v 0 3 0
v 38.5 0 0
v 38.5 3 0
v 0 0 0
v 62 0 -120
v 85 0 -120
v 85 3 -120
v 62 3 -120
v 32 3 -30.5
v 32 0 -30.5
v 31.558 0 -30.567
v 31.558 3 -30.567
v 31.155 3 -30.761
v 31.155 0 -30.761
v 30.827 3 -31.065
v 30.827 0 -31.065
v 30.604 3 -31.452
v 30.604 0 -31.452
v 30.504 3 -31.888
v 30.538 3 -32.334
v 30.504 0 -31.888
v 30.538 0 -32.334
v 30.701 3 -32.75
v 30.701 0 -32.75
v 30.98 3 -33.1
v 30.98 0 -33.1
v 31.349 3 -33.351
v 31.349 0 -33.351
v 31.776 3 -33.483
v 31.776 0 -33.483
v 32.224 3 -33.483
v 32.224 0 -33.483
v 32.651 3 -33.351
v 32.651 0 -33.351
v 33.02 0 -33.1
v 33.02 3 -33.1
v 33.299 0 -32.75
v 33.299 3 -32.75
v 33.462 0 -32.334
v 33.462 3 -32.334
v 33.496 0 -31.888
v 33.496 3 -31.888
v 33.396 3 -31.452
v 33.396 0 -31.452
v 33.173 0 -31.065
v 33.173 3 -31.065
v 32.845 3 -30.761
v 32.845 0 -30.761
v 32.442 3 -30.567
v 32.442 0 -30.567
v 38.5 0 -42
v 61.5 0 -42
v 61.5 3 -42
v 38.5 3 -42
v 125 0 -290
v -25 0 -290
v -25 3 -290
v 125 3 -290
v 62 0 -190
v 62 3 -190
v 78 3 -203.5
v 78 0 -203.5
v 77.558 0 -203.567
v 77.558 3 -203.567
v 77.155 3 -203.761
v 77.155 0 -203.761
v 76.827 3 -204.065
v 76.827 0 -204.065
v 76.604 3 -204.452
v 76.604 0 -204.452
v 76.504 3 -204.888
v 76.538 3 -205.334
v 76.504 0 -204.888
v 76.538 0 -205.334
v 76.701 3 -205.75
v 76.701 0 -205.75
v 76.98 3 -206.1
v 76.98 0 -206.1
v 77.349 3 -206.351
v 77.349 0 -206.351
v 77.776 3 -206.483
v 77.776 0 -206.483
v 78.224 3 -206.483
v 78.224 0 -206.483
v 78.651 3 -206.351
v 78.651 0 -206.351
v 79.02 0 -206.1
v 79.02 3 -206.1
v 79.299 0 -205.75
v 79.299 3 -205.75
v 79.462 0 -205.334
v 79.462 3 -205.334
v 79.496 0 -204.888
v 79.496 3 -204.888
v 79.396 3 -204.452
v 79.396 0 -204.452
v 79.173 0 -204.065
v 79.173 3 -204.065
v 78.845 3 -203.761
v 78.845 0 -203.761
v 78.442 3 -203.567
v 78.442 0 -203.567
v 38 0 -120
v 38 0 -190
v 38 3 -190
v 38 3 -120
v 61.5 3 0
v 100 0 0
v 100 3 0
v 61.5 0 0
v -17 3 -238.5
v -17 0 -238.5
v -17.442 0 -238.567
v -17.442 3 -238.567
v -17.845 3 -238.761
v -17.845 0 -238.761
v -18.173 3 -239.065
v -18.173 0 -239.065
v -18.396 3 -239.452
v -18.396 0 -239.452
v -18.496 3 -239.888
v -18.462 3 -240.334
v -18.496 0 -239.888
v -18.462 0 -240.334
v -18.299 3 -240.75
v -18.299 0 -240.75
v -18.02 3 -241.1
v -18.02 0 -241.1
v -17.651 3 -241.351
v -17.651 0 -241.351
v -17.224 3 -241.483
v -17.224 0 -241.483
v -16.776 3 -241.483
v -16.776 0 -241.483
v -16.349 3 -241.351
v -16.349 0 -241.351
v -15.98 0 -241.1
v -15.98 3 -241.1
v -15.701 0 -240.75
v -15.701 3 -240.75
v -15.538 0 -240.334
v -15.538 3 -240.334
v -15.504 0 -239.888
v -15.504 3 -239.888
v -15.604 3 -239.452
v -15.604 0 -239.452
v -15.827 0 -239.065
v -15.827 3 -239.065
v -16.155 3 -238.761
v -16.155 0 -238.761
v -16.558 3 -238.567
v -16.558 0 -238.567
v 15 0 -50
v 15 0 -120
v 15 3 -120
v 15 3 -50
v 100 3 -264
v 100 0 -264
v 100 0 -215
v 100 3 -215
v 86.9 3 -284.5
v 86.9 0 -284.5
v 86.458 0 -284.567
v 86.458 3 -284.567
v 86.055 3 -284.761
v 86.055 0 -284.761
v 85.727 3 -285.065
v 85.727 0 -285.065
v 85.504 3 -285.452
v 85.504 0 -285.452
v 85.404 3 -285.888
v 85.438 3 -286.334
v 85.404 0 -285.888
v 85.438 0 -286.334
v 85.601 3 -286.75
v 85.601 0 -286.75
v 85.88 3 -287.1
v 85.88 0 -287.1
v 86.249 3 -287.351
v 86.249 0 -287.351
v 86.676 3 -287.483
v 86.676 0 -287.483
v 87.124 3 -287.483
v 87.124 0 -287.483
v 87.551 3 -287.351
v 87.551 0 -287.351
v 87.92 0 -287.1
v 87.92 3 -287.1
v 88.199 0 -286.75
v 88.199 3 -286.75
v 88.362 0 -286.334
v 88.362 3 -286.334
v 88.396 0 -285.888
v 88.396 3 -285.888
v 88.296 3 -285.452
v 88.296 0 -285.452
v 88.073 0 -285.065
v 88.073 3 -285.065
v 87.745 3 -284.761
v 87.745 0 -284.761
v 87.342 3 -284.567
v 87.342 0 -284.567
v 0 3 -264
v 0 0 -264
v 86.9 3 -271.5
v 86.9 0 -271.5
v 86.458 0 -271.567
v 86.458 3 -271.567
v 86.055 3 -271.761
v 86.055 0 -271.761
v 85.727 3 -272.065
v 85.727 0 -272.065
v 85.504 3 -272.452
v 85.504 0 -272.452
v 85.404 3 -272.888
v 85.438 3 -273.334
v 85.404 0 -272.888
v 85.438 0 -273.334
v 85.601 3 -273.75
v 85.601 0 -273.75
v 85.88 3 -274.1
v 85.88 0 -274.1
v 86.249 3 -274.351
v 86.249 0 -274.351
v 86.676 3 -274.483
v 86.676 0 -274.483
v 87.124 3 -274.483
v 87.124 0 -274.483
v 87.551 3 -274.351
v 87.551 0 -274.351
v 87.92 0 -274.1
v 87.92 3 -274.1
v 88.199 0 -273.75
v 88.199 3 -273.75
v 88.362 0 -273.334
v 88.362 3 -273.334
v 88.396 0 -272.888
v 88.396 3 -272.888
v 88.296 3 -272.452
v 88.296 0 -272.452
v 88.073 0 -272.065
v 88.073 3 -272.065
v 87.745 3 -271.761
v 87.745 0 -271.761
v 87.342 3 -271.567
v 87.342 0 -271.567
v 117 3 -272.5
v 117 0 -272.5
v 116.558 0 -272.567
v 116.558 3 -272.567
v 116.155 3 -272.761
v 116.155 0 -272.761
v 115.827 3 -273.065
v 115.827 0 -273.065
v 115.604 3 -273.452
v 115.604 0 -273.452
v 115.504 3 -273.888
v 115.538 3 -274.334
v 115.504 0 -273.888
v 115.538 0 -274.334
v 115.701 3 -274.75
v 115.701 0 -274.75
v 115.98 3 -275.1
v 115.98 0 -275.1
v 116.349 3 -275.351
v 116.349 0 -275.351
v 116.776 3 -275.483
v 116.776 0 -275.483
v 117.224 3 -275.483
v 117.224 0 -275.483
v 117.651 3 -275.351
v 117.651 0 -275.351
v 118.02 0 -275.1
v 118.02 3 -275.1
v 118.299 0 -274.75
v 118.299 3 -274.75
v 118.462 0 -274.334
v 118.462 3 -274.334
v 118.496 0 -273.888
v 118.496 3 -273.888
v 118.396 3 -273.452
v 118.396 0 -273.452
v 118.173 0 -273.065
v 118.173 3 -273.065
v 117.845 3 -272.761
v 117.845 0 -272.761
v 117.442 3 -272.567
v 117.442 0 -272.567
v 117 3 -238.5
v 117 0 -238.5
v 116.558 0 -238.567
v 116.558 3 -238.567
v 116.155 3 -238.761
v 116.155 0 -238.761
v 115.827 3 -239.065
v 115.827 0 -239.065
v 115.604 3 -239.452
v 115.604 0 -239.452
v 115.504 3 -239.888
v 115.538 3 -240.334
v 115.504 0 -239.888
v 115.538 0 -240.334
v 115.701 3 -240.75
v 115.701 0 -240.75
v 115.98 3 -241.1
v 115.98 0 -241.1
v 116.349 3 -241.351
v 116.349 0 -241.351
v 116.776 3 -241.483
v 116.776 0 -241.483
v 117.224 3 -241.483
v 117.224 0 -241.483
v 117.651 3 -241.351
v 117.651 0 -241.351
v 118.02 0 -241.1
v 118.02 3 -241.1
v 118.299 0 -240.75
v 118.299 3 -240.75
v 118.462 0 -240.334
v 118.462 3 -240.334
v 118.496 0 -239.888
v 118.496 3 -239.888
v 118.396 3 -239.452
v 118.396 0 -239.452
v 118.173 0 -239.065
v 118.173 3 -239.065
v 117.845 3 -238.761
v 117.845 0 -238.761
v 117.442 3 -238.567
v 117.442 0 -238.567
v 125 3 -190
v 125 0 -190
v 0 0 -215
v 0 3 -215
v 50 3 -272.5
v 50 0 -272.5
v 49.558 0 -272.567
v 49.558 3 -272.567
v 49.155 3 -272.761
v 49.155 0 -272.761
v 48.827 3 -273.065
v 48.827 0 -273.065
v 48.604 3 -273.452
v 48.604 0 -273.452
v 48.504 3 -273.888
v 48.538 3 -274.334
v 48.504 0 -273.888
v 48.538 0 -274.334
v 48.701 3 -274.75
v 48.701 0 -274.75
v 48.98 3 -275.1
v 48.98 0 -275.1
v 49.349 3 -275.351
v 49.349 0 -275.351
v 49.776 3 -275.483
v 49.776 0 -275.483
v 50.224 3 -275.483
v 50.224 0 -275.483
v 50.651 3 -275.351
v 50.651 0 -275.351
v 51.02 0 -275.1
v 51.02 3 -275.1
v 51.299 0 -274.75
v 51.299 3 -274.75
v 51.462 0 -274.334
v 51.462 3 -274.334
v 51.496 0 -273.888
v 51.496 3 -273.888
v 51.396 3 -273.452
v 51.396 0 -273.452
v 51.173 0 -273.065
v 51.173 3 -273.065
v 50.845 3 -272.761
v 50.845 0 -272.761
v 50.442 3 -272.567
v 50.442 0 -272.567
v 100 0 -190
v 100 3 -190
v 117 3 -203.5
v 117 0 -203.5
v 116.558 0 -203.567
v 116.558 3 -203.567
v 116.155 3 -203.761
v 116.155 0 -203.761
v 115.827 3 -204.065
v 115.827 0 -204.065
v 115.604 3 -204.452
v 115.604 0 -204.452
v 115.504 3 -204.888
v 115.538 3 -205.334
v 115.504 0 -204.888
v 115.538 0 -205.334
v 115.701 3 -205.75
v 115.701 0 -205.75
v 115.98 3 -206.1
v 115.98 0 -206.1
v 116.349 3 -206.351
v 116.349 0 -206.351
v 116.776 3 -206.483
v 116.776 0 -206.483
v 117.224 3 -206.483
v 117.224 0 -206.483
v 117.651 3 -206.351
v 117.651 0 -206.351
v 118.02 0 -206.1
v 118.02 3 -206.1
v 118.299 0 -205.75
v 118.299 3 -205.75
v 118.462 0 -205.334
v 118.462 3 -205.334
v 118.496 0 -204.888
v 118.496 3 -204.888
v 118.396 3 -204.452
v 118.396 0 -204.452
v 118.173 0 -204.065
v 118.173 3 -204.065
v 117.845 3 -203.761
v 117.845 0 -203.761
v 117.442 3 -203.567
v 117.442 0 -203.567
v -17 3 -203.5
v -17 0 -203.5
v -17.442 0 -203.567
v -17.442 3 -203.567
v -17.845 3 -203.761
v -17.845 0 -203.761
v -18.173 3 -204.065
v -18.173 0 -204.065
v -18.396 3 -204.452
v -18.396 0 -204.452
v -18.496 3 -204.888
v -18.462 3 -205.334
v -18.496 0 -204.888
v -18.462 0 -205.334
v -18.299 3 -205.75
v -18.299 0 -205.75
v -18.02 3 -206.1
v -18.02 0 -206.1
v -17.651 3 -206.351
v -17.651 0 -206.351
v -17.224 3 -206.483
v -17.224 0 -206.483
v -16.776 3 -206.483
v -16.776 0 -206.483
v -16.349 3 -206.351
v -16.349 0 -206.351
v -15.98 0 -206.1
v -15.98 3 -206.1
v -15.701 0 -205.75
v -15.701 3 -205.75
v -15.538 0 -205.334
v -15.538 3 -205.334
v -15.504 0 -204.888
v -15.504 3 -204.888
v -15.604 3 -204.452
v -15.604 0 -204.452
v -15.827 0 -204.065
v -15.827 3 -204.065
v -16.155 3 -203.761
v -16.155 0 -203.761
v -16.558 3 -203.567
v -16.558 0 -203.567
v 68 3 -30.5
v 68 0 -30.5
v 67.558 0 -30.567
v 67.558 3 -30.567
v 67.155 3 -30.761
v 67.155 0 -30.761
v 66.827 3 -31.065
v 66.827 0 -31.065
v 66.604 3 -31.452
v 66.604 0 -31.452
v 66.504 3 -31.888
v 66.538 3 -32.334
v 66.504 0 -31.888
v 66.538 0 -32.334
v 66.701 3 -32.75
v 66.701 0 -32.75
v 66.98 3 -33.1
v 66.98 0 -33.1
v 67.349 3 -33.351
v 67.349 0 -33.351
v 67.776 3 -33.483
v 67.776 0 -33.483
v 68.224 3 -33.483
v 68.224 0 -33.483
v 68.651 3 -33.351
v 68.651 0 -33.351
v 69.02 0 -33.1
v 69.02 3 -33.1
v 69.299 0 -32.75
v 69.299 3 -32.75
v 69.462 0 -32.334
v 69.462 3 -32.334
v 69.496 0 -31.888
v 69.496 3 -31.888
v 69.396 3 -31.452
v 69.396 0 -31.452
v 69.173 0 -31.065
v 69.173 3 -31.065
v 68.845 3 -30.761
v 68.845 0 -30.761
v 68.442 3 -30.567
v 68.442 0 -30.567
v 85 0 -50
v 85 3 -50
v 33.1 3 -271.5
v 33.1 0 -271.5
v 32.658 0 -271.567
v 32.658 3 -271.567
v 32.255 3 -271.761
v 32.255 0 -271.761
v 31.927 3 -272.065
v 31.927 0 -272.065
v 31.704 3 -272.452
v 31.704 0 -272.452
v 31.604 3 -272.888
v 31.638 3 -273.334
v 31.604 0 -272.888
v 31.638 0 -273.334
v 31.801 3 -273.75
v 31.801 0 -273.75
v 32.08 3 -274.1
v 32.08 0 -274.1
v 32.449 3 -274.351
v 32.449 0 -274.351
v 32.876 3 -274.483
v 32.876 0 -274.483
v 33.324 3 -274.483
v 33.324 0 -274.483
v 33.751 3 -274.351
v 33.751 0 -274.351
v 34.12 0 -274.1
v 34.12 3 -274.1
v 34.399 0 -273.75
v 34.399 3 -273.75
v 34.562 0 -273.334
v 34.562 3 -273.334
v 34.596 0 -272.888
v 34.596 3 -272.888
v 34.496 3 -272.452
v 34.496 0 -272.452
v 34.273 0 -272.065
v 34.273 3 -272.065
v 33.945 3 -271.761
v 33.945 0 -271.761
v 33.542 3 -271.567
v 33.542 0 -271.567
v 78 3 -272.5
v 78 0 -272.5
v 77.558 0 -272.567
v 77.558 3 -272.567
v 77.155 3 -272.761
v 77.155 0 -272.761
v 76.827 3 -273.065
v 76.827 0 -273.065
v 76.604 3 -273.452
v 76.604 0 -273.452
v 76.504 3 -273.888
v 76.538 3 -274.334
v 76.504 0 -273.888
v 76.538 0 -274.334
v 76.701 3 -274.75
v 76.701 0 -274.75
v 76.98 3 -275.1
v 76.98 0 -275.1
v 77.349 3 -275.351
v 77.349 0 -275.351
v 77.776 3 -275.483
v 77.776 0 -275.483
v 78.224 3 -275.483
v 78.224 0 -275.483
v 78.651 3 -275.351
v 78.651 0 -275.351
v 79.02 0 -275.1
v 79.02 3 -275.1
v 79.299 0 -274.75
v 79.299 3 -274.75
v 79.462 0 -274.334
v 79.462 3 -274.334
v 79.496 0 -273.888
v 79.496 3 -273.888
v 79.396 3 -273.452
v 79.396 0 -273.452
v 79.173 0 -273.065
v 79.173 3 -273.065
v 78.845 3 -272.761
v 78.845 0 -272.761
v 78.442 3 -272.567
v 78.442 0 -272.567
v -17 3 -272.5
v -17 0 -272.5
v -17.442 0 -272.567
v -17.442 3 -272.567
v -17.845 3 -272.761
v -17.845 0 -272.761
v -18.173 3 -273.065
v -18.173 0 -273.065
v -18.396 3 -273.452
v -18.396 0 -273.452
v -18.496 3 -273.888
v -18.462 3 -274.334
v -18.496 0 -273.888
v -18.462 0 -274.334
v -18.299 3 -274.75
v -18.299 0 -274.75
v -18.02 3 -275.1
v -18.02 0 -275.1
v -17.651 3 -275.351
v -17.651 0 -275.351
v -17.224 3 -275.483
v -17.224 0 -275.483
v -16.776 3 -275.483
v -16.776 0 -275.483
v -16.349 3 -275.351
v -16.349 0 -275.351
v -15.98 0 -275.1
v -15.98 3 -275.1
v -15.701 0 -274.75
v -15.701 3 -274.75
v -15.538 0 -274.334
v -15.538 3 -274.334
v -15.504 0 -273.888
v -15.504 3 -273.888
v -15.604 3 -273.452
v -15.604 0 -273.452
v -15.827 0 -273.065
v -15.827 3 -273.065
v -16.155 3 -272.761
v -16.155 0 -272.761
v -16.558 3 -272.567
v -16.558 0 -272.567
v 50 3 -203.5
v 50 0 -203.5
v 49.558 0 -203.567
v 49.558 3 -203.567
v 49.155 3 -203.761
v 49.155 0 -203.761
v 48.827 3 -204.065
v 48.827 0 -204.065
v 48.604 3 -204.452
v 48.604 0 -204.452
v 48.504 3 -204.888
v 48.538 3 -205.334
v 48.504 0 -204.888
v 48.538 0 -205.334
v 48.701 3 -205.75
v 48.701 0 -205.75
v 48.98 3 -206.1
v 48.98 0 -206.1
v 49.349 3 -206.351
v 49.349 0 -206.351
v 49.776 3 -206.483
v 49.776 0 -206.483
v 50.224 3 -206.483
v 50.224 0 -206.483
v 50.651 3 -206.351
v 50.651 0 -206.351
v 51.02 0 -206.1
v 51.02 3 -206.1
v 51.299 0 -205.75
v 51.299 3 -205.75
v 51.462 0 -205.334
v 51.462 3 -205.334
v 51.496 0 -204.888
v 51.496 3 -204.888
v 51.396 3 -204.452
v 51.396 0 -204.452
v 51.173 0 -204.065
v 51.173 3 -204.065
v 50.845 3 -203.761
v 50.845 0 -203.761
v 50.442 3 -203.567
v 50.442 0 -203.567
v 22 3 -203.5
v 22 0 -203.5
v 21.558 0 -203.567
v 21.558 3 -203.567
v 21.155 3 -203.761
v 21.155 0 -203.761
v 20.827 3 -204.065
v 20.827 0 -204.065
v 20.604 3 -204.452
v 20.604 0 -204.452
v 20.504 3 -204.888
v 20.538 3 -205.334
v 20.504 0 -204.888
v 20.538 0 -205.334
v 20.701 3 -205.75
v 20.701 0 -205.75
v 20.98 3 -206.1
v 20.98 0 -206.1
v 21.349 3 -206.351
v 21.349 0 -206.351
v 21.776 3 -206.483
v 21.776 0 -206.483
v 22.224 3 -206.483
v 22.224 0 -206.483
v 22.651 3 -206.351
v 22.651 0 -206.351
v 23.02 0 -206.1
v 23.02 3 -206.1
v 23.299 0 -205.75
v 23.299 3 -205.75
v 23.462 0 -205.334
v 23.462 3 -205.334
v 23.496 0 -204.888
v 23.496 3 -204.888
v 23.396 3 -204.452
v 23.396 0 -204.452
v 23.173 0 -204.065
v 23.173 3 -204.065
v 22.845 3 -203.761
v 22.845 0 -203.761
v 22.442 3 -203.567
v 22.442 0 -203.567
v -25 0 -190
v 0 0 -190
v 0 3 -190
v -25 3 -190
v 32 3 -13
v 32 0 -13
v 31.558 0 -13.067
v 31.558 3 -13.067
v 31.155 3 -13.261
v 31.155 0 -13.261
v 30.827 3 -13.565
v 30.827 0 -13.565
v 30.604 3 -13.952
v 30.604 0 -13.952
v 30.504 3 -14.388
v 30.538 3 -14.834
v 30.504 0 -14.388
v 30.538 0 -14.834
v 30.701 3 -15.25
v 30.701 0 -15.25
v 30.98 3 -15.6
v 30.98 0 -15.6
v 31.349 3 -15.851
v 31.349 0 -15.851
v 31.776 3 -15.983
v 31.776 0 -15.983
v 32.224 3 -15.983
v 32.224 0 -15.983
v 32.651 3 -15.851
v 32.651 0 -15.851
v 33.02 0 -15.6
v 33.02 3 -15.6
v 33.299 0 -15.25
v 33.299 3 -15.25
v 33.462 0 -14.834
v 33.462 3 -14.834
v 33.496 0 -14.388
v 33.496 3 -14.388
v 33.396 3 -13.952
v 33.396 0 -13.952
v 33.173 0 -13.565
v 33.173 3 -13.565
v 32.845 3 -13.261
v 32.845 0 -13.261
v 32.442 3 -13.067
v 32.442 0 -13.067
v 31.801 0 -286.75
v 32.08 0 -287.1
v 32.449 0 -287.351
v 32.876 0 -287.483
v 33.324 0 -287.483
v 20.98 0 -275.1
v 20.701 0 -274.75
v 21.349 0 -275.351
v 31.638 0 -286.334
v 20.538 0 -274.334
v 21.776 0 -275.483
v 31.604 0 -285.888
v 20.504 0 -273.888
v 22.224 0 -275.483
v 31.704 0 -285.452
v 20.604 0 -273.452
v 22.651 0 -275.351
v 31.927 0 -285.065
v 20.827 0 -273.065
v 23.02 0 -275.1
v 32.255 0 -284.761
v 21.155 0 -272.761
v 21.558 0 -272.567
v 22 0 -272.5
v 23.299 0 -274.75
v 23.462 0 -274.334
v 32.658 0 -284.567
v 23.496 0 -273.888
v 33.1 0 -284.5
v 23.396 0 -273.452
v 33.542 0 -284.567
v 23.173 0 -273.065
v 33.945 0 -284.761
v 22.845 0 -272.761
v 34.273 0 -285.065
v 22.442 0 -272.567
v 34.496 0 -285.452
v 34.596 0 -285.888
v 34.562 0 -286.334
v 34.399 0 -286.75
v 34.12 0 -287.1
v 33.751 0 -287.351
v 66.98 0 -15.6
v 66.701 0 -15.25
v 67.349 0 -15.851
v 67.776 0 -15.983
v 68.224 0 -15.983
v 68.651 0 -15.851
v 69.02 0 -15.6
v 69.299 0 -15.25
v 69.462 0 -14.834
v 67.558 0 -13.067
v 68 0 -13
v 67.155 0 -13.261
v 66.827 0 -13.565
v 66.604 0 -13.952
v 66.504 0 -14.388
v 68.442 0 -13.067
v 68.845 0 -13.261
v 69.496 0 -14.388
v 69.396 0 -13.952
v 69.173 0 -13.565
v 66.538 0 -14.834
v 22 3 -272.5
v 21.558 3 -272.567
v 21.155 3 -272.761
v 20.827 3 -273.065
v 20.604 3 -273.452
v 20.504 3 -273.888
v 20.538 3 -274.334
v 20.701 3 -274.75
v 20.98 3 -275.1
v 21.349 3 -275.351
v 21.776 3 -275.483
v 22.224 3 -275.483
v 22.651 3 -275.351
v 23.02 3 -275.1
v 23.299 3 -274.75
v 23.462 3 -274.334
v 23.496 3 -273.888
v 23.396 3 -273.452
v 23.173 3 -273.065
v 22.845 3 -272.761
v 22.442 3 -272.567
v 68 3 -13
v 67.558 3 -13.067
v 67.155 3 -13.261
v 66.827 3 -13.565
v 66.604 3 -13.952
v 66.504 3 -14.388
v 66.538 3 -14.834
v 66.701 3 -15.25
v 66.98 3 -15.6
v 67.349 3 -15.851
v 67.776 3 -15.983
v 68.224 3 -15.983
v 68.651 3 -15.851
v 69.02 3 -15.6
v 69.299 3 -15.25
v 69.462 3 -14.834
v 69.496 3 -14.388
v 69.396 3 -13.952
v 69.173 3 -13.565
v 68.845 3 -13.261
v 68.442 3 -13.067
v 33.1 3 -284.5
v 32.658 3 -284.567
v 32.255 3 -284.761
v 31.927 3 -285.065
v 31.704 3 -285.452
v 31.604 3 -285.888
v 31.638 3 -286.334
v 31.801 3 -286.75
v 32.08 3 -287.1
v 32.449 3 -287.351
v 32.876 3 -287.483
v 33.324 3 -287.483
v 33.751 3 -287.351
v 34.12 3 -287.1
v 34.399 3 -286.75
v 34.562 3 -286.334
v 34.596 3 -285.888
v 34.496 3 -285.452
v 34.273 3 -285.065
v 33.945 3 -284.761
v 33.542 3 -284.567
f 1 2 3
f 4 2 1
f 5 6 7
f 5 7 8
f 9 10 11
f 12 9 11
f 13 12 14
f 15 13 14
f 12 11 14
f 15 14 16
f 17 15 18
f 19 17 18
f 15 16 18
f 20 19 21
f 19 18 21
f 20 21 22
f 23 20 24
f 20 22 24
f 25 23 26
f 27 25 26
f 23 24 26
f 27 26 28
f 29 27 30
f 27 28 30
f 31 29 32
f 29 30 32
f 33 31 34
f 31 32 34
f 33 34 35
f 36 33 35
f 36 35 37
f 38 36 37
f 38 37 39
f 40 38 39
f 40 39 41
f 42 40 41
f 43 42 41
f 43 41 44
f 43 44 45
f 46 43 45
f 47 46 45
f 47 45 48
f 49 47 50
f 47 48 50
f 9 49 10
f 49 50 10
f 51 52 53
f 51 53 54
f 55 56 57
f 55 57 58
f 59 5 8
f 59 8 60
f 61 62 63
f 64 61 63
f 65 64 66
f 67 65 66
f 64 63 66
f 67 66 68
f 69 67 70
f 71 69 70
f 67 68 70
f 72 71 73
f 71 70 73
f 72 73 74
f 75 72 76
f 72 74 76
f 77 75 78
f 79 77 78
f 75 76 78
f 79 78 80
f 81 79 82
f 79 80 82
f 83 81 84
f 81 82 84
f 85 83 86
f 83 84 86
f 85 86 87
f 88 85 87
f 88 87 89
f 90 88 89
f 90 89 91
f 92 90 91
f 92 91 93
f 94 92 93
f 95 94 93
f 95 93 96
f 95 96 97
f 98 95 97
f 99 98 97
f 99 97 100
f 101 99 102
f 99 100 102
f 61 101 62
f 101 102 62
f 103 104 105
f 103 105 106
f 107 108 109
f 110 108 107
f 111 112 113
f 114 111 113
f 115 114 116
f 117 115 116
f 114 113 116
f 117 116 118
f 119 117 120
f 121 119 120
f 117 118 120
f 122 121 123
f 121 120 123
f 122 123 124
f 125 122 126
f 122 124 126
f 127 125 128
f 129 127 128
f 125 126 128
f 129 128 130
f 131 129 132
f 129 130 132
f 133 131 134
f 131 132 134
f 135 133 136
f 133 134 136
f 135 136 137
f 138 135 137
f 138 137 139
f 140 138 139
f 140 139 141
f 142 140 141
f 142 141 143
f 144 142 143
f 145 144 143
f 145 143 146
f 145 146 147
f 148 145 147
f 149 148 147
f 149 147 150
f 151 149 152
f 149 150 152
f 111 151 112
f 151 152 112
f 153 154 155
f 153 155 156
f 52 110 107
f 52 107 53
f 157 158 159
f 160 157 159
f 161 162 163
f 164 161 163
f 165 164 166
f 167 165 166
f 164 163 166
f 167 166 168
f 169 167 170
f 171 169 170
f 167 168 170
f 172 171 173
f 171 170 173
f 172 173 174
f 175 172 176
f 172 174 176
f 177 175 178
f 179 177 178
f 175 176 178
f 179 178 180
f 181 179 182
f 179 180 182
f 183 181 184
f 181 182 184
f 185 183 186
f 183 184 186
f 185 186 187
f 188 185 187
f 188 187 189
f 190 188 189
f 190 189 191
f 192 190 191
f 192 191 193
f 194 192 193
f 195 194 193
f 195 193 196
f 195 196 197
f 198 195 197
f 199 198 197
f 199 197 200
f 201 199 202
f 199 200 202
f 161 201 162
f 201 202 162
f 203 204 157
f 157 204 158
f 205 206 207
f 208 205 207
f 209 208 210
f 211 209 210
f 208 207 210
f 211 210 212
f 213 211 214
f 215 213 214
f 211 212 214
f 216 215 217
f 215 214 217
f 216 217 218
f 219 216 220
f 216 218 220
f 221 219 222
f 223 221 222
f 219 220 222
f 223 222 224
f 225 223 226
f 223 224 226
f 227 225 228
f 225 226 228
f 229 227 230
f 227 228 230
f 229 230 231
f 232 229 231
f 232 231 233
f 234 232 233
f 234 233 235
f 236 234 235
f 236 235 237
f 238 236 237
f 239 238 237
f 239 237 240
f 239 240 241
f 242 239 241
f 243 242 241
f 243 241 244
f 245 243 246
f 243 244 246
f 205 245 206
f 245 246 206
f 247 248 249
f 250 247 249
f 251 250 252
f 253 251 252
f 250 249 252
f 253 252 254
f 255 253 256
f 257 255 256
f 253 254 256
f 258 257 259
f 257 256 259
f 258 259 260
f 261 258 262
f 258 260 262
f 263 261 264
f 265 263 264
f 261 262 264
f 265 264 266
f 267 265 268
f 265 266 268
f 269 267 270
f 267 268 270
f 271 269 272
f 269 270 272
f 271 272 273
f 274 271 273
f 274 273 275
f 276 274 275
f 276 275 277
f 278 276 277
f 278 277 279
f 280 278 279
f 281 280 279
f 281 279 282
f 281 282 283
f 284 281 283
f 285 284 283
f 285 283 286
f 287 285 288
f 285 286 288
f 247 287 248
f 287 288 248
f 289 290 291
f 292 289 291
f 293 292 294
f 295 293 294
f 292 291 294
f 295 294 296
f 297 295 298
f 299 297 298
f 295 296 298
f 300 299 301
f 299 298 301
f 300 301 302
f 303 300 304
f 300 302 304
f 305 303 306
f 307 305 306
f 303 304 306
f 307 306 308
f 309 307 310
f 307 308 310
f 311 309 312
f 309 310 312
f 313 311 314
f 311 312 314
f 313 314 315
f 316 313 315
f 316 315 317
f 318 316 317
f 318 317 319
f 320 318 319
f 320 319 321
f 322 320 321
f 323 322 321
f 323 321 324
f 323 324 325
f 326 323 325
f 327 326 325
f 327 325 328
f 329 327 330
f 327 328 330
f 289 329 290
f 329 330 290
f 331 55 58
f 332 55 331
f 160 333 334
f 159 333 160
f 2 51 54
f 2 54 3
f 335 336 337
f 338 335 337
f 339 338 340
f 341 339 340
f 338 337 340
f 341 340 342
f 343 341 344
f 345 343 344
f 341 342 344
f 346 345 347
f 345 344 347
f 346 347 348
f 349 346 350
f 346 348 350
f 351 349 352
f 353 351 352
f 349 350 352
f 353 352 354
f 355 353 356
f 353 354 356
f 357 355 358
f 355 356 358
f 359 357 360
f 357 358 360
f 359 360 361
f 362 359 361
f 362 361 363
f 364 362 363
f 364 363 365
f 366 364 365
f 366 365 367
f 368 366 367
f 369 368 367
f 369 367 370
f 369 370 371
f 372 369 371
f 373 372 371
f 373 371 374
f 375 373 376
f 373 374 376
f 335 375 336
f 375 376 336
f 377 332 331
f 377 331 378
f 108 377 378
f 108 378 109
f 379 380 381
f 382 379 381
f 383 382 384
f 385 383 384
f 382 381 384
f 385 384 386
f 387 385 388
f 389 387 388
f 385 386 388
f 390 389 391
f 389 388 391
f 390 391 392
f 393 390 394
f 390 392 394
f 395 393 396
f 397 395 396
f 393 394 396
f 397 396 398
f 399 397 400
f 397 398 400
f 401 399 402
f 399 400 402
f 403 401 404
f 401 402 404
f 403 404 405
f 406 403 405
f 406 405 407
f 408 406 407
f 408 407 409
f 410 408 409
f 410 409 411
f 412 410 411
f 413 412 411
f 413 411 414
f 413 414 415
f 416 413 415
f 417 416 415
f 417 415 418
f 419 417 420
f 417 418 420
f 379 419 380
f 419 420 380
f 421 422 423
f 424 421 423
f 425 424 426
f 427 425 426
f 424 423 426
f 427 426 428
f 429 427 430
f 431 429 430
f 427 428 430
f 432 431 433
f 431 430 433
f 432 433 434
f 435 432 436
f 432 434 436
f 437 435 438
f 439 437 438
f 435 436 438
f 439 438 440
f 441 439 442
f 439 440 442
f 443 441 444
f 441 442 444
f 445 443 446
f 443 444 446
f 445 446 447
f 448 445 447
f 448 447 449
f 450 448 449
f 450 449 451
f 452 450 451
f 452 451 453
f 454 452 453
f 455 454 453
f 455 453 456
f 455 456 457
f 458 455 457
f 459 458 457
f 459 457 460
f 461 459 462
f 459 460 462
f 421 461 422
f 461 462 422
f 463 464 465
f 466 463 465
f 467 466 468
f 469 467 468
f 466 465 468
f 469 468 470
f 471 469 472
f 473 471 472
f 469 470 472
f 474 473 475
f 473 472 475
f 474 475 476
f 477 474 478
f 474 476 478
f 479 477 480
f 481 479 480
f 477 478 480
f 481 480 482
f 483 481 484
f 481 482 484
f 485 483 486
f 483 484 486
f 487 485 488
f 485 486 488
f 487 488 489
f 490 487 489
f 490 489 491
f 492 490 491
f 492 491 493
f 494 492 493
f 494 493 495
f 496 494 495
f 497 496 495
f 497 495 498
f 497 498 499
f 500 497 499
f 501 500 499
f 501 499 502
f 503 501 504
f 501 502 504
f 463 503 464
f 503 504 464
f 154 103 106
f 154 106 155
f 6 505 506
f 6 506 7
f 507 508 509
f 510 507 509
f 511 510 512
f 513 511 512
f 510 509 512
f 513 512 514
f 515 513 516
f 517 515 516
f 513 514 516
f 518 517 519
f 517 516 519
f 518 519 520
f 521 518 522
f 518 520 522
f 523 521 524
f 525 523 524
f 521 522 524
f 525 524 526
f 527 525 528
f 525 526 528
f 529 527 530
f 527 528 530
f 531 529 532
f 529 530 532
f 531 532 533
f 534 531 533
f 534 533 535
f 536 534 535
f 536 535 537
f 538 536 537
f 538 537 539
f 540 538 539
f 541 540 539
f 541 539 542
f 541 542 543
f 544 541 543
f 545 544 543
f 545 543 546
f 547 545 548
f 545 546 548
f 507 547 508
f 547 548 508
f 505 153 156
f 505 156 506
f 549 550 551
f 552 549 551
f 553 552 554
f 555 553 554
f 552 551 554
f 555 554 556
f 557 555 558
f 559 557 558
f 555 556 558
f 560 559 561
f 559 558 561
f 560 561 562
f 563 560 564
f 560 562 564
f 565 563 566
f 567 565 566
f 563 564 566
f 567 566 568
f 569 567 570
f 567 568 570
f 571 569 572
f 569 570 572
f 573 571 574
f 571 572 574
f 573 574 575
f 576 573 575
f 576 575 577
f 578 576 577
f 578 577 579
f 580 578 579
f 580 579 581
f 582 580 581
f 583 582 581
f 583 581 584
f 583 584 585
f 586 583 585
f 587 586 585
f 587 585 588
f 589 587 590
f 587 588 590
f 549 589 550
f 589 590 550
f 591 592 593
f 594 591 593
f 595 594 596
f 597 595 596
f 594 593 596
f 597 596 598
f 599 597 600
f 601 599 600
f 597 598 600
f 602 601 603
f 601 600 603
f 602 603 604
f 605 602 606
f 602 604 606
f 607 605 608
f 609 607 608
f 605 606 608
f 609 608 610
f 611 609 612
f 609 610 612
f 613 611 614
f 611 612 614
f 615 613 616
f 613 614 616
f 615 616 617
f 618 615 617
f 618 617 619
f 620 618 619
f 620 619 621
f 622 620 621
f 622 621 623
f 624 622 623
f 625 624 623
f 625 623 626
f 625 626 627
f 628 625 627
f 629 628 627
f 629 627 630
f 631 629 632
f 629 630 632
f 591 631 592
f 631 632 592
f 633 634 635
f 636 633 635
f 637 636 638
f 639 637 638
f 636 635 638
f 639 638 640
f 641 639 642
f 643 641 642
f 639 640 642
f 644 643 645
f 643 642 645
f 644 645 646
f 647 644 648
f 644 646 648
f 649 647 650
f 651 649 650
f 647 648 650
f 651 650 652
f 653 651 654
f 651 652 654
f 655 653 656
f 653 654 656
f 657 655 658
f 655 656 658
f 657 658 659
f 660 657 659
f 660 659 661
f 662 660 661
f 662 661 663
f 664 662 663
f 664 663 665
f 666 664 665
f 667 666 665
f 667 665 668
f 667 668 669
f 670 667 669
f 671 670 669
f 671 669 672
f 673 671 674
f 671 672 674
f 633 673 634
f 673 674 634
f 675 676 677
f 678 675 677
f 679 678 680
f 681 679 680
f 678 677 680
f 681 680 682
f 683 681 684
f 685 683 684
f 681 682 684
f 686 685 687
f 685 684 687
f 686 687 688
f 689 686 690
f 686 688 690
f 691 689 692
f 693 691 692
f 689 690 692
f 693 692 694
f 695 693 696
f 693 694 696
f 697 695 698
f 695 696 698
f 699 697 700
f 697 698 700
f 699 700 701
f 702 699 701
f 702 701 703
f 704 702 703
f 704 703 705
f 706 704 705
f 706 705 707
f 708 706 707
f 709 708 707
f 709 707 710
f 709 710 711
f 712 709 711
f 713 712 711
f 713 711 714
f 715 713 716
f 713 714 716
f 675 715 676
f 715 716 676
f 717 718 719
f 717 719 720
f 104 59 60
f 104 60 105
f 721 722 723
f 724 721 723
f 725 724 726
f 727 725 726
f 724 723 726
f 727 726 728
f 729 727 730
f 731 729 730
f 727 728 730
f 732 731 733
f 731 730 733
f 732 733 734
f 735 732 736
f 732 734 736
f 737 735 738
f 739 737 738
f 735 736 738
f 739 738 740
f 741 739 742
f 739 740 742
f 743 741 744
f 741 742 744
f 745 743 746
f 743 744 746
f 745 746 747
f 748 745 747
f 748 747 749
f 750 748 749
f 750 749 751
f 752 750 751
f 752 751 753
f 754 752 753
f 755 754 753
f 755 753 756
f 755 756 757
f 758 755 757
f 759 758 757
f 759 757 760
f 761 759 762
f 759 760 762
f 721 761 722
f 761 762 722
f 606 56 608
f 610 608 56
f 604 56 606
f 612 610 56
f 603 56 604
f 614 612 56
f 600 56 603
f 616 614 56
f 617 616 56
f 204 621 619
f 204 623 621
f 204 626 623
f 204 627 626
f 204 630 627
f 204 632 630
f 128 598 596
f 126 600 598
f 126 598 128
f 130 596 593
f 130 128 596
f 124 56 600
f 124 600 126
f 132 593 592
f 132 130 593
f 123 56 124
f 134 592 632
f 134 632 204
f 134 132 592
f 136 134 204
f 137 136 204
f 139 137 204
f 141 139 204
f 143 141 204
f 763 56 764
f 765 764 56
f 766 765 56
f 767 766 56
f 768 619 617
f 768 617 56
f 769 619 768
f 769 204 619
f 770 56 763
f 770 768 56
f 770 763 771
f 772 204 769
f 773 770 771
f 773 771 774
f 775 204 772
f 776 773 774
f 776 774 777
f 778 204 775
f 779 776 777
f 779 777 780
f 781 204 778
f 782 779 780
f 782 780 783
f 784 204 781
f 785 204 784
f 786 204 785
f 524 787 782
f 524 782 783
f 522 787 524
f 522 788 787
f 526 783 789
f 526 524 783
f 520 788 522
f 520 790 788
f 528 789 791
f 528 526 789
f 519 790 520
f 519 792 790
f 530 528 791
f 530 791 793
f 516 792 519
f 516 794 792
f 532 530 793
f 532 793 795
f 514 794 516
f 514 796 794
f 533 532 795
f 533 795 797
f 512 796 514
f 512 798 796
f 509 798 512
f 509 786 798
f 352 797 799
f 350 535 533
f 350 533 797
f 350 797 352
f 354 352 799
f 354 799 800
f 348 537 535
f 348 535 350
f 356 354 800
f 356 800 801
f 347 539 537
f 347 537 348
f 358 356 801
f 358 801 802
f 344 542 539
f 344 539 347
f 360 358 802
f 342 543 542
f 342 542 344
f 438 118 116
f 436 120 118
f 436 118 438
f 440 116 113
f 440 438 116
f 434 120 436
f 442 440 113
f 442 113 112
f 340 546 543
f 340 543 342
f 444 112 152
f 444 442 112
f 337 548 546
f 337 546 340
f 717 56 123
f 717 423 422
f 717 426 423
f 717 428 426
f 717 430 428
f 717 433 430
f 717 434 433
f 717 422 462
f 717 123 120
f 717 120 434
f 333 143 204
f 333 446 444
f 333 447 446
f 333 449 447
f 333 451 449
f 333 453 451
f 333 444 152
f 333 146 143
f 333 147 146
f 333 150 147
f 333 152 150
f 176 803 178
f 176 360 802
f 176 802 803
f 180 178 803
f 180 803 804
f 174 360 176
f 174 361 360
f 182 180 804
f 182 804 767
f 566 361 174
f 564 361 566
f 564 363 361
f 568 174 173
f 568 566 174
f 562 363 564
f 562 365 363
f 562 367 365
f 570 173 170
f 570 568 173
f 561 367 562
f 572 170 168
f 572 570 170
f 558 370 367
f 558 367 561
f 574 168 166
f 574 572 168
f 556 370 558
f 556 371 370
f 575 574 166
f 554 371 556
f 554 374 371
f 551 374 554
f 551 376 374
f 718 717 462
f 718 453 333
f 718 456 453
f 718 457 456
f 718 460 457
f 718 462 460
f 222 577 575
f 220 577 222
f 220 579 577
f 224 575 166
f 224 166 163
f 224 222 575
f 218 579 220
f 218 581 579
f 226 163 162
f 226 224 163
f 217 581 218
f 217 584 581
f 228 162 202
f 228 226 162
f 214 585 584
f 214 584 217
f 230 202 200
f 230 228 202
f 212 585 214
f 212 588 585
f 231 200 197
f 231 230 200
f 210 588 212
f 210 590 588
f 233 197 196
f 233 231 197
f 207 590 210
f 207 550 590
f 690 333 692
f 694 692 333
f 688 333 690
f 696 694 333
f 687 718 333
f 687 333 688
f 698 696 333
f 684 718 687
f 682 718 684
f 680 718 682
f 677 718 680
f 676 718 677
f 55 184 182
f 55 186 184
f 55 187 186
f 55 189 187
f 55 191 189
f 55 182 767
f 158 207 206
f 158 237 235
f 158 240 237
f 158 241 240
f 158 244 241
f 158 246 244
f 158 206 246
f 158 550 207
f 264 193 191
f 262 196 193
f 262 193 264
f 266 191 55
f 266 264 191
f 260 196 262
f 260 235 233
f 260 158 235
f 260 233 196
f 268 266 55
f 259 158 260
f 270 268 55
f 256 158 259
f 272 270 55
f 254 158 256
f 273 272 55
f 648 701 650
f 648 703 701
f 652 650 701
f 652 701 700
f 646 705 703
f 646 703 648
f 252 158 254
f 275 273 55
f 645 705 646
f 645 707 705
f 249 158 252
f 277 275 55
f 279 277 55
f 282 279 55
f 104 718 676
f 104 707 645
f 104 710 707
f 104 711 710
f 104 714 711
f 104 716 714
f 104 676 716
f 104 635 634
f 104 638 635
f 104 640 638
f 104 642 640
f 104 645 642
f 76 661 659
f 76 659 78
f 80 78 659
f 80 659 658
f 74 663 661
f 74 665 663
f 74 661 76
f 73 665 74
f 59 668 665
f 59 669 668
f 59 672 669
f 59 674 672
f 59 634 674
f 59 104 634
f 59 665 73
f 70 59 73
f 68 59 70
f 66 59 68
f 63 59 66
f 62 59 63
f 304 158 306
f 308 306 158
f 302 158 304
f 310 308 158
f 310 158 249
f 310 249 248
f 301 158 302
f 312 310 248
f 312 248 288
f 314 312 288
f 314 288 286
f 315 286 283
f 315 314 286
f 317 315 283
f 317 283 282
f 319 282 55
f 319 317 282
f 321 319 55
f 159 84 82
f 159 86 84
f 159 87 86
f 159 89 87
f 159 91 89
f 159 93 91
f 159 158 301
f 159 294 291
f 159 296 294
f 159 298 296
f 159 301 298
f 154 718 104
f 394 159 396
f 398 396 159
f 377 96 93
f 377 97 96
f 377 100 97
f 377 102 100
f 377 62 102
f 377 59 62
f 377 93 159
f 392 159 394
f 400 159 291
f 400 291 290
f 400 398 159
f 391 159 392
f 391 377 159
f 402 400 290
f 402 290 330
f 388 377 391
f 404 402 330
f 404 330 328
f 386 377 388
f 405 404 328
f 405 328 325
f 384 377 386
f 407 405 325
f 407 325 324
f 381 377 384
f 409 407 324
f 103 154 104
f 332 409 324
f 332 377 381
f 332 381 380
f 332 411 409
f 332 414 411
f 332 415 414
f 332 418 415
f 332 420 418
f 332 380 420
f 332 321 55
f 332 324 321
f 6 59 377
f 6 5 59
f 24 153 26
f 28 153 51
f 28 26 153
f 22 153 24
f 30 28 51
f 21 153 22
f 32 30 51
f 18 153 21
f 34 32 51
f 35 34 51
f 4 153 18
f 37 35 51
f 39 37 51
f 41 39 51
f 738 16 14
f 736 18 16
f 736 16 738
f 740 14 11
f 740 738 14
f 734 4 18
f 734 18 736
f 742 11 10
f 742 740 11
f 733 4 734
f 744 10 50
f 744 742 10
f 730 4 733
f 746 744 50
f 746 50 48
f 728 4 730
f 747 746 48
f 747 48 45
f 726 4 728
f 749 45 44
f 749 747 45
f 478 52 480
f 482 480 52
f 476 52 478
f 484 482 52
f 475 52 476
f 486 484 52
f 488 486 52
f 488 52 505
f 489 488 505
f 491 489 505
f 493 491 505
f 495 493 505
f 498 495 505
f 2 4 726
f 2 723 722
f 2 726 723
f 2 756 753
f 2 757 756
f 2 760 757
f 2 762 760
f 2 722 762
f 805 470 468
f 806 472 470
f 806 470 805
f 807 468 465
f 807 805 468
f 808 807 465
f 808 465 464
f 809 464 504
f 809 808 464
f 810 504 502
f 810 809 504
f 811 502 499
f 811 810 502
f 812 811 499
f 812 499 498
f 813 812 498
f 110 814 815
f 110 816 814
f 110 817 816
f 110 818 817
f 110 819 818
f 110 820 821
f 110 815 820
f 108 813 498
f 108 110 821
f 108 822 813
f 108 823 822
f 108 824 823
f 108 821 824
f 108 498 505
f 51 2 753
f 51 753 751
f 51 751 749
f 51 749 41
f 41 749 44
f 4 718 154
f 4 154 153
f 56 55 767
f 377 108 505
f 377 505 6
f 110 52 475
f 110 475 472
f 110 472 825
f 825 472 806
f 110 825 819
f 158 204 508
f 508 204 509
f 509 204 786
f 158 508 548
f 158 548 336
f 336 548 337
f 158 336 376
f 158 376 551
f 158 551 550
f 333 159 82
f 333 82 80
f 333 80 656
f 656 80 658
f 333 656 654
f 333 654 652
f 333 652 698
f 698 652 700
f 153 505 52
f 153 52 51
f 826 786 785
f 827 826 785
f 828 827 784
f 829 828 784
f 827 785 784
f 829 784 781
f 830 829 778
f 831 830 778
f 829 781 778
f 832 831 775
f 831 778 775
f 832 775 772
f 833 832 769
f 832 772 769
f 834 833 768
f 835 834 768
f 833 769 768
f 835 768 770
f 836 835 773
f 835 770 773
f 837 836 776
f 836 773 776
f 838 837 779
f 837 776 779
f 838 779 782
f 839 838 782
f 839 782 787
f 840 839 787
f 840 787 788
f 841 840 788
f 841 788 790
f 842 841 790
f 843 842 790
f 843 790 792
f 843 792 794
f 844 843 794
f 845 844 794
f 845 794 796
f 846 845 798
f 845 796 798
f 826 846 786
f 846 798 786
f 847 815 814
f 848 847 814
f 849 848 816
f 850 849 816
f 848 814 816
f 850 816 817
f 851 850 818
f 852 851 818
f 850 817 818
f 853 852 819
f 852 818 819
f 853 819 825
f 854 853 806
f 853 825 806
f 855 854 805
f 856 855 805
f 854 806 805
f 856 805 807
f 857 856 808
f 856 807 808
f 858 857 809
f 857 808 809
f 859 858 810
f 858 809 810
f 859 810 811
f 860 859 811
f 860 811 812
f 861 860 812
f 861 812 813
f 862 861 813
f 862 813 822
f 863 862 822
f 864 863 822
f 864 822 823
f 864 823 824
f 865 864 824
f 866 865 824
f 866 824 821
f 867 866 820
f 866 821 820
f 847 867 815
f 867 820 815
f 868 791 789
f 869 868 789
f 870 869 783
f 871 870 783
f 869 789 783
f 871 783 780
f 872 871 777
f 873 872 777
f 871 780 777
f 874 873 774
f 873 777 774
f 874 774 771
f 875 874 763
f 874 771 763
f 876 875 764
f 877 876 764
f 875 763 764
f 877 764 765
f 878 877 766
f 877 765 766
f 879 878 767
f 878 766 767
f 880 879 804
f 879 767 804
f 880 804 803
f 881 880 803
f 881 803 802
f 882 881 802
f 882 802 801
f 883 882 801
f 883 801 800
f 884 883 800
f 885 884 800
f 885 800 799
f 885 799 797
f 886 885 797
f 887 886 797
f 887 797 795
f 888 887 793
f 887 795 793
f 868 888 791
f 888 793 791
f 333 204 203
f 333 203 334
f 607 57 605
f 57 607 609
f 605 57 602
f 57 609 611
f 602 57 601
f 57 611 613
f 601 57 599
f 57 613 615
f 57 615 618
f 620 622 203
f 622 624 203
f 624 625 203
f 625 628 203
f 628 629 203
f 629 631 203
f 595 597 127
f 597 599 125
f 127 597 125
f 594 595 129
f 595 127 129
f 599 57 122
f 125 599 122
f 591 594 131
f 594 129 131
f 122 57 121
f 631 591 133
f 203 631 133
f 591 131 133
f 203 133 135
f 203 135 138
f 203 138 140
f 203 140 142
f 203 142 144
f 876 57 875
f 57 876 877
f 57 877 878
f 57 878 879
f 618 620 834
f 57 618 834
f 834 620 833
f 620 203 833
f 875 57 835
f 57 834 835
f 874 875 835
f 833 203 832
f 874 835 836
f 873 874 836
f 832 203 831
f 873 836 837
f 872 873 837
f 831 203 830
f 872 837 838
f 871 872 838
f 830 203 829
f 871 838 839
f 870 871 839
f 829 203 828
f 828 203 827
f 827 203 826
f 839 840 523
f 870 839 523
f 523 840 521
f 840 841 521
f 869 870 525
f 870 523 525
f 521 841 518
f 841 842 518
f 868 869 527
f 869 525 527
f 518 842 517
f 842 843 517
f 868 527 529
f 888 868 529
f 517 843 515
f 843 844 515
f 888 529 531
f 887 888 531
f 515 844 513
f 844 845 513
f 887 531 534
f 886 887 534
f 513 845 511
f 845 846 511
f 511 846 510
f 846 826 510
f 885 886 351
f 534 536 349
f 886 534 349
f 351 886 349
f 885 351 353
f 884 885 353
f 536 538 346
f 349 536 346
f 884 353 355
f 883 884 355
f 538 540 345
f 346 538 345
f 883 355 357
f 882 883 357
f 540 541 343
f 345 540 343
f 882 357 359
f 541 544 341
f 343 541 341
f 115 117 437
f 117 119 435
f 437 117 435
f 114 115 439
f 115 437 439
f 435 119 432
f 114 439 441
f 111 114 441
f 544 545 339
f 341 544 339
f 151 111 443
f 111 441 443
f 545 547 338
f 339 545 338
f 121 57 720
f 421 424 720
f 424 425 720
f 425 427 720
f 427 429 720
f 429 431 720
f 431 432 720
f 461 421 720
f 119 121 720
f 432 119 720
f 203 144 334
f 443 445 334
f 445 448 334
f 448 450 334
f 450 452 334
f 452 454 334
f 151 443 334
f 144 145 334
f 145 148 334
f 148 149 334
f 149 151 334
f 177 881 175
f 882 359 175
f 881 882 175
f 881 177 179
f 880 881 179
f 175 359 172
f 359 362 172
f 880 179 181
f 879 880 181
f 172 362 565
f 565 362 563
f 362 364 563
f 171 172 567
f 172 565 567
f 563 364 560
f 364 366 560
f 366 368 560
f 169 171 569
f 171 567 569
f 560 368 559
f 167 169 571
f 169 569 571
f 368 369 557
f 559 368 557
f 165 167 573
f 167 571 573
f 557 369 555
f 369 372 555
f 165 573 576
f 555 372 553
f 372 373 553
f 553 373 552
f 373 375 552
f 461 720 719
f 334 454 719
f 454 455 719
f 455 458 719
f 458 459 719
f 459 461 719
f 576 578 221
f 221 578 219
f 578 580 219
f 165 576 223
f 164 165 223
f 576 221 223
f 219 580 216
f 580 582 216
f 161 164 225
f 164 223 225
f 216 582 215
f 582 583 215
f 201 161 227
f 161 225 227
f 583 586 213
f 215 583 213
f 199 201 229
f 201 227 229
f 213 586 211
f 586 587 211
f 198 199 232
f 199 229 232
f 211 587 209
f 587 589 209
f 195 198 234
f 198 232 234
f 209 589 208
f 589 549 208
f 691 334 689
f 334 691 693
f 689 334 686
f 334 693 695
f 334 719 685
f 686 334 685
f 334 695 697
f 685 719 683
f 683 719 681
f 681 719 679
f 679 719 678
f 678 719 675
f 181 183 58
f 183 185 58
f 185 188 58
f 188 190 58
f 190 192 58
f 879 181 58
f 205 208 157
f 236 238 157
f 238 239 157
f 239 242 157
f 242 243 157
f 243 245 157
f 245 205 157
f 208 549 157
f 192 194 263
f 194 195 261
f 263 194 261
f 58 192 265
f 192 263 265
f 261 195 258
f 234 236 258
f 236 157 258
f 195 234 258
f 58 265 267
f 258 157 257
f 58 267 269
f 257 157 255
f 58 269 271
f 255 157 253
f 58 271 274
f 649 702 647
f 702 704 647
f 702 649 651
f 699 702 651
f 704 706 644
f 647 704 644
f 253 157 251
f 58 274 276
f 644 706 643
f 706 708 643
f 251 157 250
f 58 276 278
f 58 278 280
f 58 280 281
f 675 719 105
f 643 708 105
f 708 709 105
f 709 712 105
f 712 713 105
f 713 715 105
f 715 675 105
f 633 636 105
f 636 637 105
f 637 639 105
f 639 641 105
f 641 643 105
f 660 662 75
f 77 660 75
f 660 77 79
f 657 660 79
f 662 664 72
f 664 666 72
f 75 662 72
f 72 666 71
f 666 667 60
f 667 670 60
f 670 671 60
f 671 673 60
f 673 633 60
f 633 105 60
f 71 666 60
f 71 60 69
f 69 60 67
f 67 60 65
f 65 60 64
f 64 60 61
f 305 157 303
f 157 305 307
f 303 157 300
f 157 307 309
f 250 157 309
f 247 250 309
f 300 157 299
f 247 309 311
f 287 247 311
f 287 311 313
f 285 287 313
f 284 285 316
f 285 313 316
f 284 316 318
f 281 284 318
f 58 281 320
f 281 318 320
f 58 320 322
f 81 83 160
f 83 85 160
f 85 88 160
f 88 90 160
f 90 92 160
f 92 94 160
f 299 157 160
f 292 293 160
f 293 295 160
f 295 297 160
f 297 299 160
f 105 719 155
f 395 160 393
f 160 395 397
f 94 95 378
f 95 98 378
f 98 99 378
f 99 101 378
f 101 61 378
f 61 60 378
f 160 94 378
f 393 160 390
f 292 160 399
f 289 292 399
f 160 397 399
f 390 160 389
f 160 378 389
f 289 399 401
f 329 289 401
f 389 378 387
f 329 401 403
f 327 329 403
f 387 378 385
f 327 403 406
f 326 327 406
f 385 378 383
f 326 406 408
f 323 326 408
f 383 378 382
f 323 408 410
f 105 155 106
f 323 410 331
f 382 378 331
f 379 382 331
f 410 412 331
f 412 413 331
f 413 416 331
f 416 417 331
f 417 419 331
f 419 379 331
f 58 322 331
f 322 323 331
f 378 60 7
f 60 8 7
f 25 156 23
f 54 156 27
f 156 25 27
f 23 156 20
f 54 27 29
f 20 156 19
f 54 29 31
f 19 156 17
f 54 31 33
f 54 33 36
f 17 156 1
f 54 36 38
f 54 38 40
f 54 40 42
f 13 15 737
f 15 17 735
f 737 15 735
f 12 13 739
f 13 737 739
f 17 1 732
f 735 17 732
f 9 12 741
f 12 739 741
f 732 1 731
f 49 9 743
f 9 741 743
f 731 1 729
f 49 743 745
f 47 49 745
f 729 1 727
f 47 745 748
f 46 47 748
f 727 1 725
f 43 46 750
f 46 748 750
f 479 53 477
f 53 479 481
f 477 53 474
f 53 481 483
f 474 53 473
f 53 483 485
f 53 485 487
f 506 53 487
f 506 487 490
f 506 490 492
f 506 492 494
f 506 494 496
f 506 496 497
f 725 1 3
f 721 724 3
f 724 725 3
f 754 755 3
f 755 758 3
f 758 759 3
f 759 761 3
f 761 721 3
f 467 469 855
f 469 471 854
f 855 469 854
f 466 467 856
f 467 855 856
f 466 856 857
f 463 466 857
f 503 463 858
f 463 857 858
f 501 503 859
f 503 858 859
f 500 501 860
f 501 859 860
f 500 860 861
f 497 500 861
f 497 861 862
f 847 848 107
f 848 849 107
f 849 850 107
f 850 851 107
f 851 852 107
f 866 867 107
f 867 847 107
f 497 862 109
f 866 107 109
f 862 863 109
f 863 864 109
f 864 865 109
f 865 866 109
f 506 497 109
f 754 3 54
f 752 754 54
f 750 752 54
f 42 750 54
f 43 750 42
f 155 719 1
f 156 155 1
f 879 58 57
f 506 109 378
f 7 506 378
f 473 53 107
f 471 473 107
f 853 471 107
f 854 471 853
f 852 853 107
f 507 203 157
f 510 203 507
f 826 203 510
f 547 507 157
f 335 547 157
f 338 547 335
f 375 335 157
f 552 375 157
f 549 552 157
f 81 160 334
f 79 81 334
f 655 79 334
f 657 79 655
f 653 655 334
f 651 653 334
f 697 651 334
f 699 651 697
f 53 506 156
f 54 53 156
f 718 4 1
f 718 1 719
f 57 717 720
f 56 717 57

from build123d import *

# Parameters (mm, degrees)
SKETCH_1_R      = 1.5
SKETCH_1_W      = 100
SKETCH_1_H      = 49
EXTRUDE_1_DEPTH = 3


with BuildPart() as part:
    # ｽｹｯﾁ1 → ﾎﾞｽ - 押し出し1 (new body)
    with BuildSketch(Plane.XZ):
        Polygon((61.5, -42), (38.5, -42), (38.5, 0), (0, 0), (0, -190), (-25, -190), (-25, -290), (125, -290), (125, -190), (100, -190), (100, 0), (61.5, 0), align=None)
        with Locations(Location((33.1, -286, 0), (0, 0, 90))):
            Circle(SKETCH_1_R, mode=Mode.SUBTRACT)
        with Locations(Location((86.9, -286, 0), (0, 0, 90))):
            Circle(SKETCH_1_R, mode=Mode.SUBTRACT)
        with Locations(Location((-17, -274, 0), (0, 0, 90))):
            Circle(SKETCH_1_R, mode=Mode.SUBTRACT)
        with Locations(Location((50, -274, 0), (0, 0, 90))):
            Circle(SKETCH_1_R, mode=Mode.SUBTRACT)
        with Locations(Location((117, -274, 0), (0, 0, 90))):
            Circle(SKETCH_1_R, mode=Mode.SUBTRACT)
        with Locations(Location((78, -205, 0), (0, 0, 90))):
            Circle(SKETCH_1_R, mode=Mode.SUBTRACT)
        with Locations(Location((22, -205, 0), (0, 0, 90))):
            Circle(SKETCH_1_R, mode=Mode.SUBTRACT)
        with Locations(Location((68, -14.5, 0), (0, 0, 90))):
            Circle(SKETCH_1_R, mode=Mode.SUBTRACT)
        with Locations(Location((32, -32, 0), (0, 0, 90))):
            Circle(SKETCH_1_R, mode=Mode.SUBTRACT)
        with Locations(Location((32, -14.5, 0), (0, 0, 90))):
            Circle(SKETCH_1_R, mode=Mode.SUBTRACT)
        with Locations(Location((68, -32, 0), (0, 0, 90))):
            Circle(SKETCH_1_R, mode=Mode.SUBTRACT)
        with Locations(Location((-17, -205, 0), (0, 0, 90))):
            Circle(SKETCH_1_R, mode=Mode.SUBTRACT)
        with Locations(Location((50, -205, 0), (0, 0, 90))):
            Circle(SKETCH_1_R, mode=Mode.SUBTRACT)
        with Locations(Location((117, -205, 0), (0, 0, 90))):
            Circle(SKETCH_1_R, mode=Mode.SUBTRACT)
        with Locations(Location((78, -274, 0), (0, 0, 90))):
            Circle(SKETCH_1_R, mode=Mode.SUBTRACT)
        with Locations(Location((22, -274, 0), (0, 0, 90))):
            Circle(SKETCH_1_R, mode=Mode.SUBTRACT)
        with Locations(Location((86.9, -273, 0), (0, 0, 90))):
            Circle(SKETCH_1_R, mode=Mode.SUBTRACT)
        with Locations(Location((33.1, -273, 0), (0, 0, 90))):
            Circle(SKETCH_1_R, mode=Mode.SUBTRACT)
        with Locations(Location((117, -240, 0), (0, 0, 90))):
            Circle(SKETCH_1_R, mode=Mode.SUBTRACT)
        with Locations(Location((-17, -240, 0), (0, 0, 90))):
            Circle(SKETCH_1_R, mode=Mode.SUBTRACT)
        with Locations((50, -239.5)):
            Rectangle(SKETCH_1_W, SKETCH_1_H, mode=Mode.SUBTRACT)
        Polygon((85, -50), (85, -120), (62, -120), (62, -190), (38, -190), (38, -120), (15, -120), (15, -50), align=None, mode=Mode.SUBTRACT)
    extrude(amount=-EXTRUDE_1_DEPTH)


solid = part.part
